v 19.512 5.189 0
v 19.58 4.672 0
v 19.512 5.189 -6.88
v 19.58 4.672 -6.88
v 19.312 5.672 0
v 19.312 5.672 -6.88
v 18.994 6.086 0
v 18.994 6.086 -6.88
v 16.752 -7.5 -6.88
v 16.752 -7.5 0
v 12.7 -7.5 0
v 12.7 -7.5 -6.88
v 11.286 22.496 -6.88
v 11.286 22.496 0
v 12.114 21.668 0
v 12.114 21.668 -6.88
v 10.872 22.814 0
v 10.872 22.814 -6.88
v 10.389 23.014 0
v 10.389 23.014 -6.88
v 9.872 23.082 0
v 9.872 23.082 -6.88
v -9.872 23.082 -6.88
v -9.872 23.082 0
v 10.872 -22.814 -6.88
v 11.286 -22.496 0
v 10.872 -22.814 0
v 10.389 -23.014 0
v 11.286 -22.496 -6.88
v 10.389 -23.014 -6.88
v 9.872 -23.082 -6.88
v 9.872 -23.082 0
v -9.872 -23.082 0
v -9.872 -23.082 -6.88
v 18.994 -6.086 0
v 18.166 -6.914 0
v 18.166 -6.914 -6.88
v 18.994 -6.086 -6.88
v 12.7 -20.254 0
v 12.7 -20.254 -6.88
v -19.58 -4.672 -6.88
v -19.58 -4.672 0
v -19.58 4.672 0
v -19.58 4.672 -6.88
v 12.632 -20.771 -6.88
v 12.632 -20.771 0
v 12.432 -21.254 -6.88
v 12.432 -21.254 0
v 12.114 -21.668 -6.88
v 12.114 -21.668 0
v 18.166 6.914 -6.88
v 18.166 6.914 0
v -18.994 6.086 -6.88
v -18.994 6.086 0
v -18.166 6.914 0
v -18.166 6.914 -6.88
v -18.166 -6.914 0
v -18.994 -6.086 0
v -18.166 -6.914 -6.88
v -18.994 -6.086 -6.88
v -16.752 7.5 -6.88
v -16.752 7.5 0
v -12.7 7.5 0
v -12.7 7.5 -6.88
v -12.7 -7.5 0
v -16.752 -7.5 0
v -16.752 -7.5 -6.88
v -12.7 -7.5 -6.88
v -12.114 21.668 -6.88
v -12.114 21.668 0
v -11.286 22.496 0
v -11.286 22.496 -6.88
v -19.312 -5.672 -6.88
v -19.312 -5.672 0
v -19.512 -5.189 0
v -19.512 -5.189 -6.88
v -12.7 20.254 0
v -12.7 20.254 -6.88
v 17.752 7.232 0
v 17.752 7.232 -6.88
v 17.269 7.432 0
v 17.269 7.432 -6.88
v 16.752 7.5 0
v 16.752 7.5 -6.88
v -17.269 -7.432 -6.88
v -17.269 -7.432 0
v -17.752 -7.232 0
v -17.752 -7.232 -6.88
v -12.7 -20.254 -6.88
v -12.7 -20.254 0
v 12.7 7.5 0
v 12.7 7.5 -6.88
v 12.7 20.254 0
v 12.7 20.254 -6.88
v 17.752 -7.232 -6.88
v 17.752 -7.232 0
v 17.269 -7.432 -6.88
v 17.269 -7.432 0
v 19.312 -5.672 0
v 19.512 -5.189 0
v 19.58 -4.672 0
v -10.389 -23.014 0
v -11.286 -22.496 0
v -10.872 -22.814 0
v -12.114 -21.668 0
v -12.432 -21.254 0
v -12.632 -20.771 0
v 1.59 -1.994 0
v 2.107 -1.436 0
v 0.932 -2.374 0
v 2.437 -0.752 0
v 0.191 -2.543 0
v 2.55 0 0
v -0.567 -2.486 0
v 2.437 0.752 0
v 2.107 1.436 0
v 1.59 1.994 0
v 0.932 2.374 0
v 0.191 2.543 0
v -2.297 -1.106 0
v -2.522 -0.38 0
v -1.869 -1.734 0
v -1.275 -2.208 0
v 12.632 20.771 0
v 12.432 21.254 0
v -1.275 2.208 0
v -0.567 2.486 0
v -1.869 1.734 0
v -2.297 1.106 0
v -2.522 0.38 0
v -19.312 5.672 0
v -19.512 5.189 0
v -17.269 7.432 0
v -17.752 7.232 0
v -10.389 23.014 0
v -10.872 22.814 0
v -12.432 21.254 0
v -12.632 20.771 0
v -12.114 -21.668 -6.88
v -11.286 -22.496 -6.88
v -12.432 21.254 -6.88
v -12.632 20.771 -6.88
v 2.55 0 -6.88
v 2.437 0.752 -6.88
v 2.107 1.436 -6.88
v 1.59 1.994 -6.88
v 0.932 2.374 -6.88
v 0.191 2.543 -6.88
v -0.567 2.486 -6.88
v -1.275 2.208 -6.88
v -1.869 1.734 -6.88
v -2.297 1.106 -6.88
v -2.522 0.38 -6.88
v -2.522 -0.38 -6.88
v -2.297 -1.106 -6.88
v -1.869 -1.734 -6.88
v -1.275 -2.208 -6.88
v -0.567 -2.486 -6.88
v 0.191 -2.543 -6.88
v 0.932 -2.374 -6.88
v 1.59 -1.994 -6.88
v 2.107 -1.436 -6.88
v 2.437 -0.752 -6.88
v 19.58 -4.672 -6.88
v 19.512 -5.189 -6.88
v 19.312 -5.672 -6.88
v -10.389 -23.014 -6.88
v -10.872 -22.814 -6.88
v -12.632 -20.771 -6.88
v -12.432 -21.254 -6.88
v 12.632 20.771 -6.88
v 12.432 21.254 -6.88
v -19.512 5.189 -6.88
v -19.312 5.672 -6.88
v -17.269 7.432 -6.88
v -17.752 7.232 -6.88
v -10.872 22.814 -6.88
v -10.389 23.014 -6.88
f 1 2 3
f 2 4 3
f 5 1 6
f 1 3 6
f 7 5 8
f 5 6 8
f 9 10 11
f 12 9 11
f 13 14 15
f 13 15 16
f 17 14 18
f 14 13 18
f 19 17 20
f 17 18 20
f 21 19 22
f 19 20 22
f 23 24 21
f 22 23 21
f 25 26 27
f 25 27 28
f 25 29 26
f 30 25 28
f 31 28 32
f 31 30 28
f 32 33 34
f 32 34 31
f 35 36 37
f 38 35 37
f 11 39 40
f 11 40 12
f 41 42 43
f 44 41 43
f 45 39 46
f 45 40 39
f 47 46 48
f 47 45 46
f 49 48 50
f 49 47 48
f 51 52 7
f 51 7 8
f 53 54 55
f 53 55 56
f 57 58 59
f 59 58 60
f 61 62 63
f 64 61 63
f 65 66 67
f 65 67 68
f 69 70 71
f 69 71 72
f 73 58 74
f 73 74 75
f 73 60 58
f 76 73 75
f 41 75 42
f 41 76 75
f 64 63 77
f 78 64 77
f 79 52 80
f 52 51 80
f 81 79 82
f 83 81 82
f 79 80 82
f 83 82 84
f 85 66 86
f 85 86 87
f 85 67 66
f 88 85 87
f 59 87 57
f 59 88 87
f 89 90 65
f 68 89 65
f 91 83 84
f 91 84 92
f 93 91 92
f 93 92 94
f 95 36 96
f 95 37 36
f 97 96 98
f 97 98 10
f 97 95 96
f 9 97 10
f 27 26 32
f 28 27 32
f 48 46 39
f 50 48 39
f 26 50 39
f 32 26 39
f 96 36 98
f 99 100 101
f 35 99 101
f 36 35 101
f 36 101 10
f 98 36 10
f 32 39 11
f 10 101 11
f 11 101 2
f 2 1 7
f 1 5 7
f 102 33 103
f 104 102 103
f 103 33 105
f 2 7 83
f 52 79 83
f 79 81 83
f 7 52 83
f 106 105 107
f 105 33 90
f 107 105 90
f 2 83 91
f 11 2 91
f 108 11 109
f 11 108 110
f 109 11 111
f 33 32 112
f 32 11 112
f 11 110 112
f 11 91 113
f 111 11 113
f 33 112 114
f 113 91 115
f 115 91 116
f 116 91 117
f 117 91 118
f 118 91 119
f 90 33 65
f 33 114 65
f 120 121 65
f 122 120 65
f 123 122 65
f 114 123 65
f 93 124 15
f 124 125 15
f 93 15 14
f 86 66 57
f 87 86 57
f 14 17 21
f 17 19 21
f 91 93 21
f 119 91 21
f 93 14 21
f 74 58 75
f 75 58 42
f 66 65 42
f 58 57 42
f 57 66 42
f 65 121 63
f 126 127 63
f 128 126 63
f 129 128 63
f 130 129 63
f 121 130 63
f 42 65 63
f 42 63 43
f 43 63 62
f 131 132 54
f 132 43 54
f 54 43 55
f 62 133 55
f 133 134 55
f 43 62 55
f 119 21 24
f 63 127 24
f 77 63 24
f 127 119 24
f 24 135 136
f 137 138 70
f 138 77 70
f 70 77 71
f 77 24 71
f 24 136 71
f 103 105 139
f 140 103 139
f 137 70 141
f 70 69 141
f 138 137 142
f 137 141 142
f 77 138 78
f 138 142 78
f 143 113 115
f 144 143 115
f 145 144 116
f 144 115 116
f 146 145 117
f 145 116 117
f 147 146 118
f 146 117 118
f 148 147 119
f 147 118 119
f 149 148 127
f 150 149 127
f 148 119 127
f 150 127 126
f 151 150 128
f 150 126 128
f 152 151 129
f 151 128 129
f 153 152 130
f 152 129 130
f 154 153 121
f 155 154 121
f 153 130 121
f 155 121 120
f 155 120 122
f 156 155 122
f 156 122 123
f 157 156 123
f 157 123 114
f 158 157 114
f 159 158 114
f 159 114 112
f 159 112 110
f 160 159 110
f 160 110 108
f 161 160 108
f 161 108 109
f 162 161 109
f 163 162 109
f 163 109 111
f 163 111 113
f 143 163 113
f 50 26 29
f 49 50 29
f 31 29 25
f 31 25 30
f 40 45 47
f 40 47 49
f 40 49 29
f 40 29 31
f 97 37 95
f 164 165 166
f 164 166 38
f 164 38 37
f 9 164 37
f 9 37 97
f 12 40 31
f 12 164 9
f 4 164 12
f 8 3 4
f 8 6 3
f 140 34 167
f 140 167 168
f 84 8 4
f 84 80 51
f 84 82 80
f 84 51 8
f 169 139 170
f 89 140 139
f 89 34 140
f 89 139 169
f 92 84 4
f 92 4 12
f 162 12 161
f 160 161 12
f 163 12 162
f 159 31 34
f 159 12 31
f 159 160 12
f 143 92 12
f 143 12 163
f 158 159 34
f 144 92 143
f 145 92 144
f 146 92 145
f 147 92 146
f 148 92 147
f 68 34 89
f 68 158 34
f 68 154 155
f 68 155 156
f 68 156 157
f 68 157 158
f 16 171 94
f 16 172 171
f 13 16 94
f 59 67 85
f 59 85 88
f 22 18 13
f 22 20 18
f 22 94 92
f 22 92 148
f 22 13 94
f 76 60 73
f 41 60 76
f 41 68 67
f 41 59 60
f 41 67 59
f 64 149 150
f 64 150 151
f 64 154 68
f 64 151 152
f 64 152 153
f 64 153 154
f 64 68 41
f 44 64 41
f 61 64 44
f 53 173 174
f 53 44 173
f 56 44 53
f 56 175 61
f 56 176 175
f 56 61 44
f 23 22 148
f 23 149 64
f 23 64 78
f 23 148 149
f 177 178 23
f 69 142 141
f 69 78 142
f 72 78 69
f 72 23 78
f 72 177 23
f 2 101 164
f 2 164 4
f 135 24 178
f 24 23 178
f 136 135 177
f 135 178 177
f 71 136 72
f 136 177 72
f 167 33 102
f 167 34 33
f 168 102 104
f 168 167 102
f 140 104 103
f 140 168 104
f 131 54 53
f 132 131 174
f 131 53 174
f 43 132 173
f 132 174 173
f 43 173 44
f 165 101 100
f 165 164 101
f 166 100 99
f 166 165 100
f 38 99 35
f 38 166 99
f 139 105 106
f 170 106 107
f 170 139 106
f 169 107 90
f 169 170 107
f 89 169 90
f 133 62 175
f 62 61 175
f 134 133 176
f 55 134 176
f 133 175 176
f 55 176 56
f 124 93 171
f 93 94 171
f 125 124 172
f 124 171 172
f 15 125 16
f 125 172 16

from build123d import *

# Parameters (mm, degrees)
SKETCH1_W           = 25.4
SKETCH1_H           = 46.164
BOSS_EXTRUDE1_DEPTH = 6.88
SKETCH2_W           = 13.76
SKETCH2_H           = 15
BOSS_EXTRUDE2_DEPTH = 6.88
SKETCH3_R           = 2.55
CUT_EXTRUDE1_DEPTH  = 7.88
CHAMFER1_SIZE       = 2
FILLET1_R           = 2


with BuildPart() as part:
    # Sketch1 → Boss-Extrude1 (new body)
    with BuildSketch(Plane.XY):
        Rectangle(SKETCH1_W, SKETCH1_H)
    extrude(amount=-BOSS_EXTRUDE1_DEPTH)

    # Sketch2 → Boss-Extrude2 (add)
    with BuildSketch(Plane.XY):
        with Locations((-12.7, 0)):
            Rectangle(SKETCH2_W, SKETCH2_H)
    boss_extrude2 = extrude(amount=-BOSS_EXTRUDE2_DEPTH)

    # Mirror2: Boss-Extrude2 across plane
    add(boss_extrude2.mirror(Plane(origin=(0, 0, 0), x_dir=(0, 0, 1), z_dir=(1, 0, 0))))

    # Sketch3 → Cut-Extrude1 (cut, through all)
    with BuildSketch(Plane.XY):
        Circle(SKETCH3_R)
    extrude(amount=-CUT_EXTRUDE1_DEPTH, mode=Mode.SUBTRACT)

    # Chamfer1
    chamfer1_edges = [part.edges().sort_by_distance(p)[0] for p in [
        (-19.58, -7.5, -3.44),
        (-19.58, 7.5, -3.44),
        (19.58, 7.5, -3.44),
        (19.58, -7.5, -3.44),
        (-12.7, 23.082, -3.44),
        (12.7, 23.082, -3.44),
        (12.7, -23.082, -3.44),
        (-12.7, -23.082, -3.44),
    ]]
    chamfer(chamfer1_edges, length=CHAMFER1_SIZE)

    # Fillet1
    fillet1_edges = [part.edges().sort_by_distance(p)[0] for p in [
        (10.7, 23.082, -3.44),
        (-10.7, 23.082, -3.44),
        (-12.7, 21.082, -3.44),
        (-17.58, 7.5, -3.44),
        (-19.58, -5.5, -3.44),
        (-19.58, 5.5, -3.44),
        (-17.58, -7.5, -3.44),
        (-12.7, -21.082, -3.44),
        (10.7, -23.082, -3.44),
        (-10.7, -23.082, -3.44),
        (12.7, -21.082, -3.44),
        (17.58, -7.5, -3.44),
        (19.58, 5.5, -3.44),
        (19.58, -5.5, -3.44),
        (12.7, 21.082, -3.44),
        (17.58, 7.5, -3.44),
    ]]
    fillet(fillet1_edges, radius=FILLET1_R)


solid = part.part
